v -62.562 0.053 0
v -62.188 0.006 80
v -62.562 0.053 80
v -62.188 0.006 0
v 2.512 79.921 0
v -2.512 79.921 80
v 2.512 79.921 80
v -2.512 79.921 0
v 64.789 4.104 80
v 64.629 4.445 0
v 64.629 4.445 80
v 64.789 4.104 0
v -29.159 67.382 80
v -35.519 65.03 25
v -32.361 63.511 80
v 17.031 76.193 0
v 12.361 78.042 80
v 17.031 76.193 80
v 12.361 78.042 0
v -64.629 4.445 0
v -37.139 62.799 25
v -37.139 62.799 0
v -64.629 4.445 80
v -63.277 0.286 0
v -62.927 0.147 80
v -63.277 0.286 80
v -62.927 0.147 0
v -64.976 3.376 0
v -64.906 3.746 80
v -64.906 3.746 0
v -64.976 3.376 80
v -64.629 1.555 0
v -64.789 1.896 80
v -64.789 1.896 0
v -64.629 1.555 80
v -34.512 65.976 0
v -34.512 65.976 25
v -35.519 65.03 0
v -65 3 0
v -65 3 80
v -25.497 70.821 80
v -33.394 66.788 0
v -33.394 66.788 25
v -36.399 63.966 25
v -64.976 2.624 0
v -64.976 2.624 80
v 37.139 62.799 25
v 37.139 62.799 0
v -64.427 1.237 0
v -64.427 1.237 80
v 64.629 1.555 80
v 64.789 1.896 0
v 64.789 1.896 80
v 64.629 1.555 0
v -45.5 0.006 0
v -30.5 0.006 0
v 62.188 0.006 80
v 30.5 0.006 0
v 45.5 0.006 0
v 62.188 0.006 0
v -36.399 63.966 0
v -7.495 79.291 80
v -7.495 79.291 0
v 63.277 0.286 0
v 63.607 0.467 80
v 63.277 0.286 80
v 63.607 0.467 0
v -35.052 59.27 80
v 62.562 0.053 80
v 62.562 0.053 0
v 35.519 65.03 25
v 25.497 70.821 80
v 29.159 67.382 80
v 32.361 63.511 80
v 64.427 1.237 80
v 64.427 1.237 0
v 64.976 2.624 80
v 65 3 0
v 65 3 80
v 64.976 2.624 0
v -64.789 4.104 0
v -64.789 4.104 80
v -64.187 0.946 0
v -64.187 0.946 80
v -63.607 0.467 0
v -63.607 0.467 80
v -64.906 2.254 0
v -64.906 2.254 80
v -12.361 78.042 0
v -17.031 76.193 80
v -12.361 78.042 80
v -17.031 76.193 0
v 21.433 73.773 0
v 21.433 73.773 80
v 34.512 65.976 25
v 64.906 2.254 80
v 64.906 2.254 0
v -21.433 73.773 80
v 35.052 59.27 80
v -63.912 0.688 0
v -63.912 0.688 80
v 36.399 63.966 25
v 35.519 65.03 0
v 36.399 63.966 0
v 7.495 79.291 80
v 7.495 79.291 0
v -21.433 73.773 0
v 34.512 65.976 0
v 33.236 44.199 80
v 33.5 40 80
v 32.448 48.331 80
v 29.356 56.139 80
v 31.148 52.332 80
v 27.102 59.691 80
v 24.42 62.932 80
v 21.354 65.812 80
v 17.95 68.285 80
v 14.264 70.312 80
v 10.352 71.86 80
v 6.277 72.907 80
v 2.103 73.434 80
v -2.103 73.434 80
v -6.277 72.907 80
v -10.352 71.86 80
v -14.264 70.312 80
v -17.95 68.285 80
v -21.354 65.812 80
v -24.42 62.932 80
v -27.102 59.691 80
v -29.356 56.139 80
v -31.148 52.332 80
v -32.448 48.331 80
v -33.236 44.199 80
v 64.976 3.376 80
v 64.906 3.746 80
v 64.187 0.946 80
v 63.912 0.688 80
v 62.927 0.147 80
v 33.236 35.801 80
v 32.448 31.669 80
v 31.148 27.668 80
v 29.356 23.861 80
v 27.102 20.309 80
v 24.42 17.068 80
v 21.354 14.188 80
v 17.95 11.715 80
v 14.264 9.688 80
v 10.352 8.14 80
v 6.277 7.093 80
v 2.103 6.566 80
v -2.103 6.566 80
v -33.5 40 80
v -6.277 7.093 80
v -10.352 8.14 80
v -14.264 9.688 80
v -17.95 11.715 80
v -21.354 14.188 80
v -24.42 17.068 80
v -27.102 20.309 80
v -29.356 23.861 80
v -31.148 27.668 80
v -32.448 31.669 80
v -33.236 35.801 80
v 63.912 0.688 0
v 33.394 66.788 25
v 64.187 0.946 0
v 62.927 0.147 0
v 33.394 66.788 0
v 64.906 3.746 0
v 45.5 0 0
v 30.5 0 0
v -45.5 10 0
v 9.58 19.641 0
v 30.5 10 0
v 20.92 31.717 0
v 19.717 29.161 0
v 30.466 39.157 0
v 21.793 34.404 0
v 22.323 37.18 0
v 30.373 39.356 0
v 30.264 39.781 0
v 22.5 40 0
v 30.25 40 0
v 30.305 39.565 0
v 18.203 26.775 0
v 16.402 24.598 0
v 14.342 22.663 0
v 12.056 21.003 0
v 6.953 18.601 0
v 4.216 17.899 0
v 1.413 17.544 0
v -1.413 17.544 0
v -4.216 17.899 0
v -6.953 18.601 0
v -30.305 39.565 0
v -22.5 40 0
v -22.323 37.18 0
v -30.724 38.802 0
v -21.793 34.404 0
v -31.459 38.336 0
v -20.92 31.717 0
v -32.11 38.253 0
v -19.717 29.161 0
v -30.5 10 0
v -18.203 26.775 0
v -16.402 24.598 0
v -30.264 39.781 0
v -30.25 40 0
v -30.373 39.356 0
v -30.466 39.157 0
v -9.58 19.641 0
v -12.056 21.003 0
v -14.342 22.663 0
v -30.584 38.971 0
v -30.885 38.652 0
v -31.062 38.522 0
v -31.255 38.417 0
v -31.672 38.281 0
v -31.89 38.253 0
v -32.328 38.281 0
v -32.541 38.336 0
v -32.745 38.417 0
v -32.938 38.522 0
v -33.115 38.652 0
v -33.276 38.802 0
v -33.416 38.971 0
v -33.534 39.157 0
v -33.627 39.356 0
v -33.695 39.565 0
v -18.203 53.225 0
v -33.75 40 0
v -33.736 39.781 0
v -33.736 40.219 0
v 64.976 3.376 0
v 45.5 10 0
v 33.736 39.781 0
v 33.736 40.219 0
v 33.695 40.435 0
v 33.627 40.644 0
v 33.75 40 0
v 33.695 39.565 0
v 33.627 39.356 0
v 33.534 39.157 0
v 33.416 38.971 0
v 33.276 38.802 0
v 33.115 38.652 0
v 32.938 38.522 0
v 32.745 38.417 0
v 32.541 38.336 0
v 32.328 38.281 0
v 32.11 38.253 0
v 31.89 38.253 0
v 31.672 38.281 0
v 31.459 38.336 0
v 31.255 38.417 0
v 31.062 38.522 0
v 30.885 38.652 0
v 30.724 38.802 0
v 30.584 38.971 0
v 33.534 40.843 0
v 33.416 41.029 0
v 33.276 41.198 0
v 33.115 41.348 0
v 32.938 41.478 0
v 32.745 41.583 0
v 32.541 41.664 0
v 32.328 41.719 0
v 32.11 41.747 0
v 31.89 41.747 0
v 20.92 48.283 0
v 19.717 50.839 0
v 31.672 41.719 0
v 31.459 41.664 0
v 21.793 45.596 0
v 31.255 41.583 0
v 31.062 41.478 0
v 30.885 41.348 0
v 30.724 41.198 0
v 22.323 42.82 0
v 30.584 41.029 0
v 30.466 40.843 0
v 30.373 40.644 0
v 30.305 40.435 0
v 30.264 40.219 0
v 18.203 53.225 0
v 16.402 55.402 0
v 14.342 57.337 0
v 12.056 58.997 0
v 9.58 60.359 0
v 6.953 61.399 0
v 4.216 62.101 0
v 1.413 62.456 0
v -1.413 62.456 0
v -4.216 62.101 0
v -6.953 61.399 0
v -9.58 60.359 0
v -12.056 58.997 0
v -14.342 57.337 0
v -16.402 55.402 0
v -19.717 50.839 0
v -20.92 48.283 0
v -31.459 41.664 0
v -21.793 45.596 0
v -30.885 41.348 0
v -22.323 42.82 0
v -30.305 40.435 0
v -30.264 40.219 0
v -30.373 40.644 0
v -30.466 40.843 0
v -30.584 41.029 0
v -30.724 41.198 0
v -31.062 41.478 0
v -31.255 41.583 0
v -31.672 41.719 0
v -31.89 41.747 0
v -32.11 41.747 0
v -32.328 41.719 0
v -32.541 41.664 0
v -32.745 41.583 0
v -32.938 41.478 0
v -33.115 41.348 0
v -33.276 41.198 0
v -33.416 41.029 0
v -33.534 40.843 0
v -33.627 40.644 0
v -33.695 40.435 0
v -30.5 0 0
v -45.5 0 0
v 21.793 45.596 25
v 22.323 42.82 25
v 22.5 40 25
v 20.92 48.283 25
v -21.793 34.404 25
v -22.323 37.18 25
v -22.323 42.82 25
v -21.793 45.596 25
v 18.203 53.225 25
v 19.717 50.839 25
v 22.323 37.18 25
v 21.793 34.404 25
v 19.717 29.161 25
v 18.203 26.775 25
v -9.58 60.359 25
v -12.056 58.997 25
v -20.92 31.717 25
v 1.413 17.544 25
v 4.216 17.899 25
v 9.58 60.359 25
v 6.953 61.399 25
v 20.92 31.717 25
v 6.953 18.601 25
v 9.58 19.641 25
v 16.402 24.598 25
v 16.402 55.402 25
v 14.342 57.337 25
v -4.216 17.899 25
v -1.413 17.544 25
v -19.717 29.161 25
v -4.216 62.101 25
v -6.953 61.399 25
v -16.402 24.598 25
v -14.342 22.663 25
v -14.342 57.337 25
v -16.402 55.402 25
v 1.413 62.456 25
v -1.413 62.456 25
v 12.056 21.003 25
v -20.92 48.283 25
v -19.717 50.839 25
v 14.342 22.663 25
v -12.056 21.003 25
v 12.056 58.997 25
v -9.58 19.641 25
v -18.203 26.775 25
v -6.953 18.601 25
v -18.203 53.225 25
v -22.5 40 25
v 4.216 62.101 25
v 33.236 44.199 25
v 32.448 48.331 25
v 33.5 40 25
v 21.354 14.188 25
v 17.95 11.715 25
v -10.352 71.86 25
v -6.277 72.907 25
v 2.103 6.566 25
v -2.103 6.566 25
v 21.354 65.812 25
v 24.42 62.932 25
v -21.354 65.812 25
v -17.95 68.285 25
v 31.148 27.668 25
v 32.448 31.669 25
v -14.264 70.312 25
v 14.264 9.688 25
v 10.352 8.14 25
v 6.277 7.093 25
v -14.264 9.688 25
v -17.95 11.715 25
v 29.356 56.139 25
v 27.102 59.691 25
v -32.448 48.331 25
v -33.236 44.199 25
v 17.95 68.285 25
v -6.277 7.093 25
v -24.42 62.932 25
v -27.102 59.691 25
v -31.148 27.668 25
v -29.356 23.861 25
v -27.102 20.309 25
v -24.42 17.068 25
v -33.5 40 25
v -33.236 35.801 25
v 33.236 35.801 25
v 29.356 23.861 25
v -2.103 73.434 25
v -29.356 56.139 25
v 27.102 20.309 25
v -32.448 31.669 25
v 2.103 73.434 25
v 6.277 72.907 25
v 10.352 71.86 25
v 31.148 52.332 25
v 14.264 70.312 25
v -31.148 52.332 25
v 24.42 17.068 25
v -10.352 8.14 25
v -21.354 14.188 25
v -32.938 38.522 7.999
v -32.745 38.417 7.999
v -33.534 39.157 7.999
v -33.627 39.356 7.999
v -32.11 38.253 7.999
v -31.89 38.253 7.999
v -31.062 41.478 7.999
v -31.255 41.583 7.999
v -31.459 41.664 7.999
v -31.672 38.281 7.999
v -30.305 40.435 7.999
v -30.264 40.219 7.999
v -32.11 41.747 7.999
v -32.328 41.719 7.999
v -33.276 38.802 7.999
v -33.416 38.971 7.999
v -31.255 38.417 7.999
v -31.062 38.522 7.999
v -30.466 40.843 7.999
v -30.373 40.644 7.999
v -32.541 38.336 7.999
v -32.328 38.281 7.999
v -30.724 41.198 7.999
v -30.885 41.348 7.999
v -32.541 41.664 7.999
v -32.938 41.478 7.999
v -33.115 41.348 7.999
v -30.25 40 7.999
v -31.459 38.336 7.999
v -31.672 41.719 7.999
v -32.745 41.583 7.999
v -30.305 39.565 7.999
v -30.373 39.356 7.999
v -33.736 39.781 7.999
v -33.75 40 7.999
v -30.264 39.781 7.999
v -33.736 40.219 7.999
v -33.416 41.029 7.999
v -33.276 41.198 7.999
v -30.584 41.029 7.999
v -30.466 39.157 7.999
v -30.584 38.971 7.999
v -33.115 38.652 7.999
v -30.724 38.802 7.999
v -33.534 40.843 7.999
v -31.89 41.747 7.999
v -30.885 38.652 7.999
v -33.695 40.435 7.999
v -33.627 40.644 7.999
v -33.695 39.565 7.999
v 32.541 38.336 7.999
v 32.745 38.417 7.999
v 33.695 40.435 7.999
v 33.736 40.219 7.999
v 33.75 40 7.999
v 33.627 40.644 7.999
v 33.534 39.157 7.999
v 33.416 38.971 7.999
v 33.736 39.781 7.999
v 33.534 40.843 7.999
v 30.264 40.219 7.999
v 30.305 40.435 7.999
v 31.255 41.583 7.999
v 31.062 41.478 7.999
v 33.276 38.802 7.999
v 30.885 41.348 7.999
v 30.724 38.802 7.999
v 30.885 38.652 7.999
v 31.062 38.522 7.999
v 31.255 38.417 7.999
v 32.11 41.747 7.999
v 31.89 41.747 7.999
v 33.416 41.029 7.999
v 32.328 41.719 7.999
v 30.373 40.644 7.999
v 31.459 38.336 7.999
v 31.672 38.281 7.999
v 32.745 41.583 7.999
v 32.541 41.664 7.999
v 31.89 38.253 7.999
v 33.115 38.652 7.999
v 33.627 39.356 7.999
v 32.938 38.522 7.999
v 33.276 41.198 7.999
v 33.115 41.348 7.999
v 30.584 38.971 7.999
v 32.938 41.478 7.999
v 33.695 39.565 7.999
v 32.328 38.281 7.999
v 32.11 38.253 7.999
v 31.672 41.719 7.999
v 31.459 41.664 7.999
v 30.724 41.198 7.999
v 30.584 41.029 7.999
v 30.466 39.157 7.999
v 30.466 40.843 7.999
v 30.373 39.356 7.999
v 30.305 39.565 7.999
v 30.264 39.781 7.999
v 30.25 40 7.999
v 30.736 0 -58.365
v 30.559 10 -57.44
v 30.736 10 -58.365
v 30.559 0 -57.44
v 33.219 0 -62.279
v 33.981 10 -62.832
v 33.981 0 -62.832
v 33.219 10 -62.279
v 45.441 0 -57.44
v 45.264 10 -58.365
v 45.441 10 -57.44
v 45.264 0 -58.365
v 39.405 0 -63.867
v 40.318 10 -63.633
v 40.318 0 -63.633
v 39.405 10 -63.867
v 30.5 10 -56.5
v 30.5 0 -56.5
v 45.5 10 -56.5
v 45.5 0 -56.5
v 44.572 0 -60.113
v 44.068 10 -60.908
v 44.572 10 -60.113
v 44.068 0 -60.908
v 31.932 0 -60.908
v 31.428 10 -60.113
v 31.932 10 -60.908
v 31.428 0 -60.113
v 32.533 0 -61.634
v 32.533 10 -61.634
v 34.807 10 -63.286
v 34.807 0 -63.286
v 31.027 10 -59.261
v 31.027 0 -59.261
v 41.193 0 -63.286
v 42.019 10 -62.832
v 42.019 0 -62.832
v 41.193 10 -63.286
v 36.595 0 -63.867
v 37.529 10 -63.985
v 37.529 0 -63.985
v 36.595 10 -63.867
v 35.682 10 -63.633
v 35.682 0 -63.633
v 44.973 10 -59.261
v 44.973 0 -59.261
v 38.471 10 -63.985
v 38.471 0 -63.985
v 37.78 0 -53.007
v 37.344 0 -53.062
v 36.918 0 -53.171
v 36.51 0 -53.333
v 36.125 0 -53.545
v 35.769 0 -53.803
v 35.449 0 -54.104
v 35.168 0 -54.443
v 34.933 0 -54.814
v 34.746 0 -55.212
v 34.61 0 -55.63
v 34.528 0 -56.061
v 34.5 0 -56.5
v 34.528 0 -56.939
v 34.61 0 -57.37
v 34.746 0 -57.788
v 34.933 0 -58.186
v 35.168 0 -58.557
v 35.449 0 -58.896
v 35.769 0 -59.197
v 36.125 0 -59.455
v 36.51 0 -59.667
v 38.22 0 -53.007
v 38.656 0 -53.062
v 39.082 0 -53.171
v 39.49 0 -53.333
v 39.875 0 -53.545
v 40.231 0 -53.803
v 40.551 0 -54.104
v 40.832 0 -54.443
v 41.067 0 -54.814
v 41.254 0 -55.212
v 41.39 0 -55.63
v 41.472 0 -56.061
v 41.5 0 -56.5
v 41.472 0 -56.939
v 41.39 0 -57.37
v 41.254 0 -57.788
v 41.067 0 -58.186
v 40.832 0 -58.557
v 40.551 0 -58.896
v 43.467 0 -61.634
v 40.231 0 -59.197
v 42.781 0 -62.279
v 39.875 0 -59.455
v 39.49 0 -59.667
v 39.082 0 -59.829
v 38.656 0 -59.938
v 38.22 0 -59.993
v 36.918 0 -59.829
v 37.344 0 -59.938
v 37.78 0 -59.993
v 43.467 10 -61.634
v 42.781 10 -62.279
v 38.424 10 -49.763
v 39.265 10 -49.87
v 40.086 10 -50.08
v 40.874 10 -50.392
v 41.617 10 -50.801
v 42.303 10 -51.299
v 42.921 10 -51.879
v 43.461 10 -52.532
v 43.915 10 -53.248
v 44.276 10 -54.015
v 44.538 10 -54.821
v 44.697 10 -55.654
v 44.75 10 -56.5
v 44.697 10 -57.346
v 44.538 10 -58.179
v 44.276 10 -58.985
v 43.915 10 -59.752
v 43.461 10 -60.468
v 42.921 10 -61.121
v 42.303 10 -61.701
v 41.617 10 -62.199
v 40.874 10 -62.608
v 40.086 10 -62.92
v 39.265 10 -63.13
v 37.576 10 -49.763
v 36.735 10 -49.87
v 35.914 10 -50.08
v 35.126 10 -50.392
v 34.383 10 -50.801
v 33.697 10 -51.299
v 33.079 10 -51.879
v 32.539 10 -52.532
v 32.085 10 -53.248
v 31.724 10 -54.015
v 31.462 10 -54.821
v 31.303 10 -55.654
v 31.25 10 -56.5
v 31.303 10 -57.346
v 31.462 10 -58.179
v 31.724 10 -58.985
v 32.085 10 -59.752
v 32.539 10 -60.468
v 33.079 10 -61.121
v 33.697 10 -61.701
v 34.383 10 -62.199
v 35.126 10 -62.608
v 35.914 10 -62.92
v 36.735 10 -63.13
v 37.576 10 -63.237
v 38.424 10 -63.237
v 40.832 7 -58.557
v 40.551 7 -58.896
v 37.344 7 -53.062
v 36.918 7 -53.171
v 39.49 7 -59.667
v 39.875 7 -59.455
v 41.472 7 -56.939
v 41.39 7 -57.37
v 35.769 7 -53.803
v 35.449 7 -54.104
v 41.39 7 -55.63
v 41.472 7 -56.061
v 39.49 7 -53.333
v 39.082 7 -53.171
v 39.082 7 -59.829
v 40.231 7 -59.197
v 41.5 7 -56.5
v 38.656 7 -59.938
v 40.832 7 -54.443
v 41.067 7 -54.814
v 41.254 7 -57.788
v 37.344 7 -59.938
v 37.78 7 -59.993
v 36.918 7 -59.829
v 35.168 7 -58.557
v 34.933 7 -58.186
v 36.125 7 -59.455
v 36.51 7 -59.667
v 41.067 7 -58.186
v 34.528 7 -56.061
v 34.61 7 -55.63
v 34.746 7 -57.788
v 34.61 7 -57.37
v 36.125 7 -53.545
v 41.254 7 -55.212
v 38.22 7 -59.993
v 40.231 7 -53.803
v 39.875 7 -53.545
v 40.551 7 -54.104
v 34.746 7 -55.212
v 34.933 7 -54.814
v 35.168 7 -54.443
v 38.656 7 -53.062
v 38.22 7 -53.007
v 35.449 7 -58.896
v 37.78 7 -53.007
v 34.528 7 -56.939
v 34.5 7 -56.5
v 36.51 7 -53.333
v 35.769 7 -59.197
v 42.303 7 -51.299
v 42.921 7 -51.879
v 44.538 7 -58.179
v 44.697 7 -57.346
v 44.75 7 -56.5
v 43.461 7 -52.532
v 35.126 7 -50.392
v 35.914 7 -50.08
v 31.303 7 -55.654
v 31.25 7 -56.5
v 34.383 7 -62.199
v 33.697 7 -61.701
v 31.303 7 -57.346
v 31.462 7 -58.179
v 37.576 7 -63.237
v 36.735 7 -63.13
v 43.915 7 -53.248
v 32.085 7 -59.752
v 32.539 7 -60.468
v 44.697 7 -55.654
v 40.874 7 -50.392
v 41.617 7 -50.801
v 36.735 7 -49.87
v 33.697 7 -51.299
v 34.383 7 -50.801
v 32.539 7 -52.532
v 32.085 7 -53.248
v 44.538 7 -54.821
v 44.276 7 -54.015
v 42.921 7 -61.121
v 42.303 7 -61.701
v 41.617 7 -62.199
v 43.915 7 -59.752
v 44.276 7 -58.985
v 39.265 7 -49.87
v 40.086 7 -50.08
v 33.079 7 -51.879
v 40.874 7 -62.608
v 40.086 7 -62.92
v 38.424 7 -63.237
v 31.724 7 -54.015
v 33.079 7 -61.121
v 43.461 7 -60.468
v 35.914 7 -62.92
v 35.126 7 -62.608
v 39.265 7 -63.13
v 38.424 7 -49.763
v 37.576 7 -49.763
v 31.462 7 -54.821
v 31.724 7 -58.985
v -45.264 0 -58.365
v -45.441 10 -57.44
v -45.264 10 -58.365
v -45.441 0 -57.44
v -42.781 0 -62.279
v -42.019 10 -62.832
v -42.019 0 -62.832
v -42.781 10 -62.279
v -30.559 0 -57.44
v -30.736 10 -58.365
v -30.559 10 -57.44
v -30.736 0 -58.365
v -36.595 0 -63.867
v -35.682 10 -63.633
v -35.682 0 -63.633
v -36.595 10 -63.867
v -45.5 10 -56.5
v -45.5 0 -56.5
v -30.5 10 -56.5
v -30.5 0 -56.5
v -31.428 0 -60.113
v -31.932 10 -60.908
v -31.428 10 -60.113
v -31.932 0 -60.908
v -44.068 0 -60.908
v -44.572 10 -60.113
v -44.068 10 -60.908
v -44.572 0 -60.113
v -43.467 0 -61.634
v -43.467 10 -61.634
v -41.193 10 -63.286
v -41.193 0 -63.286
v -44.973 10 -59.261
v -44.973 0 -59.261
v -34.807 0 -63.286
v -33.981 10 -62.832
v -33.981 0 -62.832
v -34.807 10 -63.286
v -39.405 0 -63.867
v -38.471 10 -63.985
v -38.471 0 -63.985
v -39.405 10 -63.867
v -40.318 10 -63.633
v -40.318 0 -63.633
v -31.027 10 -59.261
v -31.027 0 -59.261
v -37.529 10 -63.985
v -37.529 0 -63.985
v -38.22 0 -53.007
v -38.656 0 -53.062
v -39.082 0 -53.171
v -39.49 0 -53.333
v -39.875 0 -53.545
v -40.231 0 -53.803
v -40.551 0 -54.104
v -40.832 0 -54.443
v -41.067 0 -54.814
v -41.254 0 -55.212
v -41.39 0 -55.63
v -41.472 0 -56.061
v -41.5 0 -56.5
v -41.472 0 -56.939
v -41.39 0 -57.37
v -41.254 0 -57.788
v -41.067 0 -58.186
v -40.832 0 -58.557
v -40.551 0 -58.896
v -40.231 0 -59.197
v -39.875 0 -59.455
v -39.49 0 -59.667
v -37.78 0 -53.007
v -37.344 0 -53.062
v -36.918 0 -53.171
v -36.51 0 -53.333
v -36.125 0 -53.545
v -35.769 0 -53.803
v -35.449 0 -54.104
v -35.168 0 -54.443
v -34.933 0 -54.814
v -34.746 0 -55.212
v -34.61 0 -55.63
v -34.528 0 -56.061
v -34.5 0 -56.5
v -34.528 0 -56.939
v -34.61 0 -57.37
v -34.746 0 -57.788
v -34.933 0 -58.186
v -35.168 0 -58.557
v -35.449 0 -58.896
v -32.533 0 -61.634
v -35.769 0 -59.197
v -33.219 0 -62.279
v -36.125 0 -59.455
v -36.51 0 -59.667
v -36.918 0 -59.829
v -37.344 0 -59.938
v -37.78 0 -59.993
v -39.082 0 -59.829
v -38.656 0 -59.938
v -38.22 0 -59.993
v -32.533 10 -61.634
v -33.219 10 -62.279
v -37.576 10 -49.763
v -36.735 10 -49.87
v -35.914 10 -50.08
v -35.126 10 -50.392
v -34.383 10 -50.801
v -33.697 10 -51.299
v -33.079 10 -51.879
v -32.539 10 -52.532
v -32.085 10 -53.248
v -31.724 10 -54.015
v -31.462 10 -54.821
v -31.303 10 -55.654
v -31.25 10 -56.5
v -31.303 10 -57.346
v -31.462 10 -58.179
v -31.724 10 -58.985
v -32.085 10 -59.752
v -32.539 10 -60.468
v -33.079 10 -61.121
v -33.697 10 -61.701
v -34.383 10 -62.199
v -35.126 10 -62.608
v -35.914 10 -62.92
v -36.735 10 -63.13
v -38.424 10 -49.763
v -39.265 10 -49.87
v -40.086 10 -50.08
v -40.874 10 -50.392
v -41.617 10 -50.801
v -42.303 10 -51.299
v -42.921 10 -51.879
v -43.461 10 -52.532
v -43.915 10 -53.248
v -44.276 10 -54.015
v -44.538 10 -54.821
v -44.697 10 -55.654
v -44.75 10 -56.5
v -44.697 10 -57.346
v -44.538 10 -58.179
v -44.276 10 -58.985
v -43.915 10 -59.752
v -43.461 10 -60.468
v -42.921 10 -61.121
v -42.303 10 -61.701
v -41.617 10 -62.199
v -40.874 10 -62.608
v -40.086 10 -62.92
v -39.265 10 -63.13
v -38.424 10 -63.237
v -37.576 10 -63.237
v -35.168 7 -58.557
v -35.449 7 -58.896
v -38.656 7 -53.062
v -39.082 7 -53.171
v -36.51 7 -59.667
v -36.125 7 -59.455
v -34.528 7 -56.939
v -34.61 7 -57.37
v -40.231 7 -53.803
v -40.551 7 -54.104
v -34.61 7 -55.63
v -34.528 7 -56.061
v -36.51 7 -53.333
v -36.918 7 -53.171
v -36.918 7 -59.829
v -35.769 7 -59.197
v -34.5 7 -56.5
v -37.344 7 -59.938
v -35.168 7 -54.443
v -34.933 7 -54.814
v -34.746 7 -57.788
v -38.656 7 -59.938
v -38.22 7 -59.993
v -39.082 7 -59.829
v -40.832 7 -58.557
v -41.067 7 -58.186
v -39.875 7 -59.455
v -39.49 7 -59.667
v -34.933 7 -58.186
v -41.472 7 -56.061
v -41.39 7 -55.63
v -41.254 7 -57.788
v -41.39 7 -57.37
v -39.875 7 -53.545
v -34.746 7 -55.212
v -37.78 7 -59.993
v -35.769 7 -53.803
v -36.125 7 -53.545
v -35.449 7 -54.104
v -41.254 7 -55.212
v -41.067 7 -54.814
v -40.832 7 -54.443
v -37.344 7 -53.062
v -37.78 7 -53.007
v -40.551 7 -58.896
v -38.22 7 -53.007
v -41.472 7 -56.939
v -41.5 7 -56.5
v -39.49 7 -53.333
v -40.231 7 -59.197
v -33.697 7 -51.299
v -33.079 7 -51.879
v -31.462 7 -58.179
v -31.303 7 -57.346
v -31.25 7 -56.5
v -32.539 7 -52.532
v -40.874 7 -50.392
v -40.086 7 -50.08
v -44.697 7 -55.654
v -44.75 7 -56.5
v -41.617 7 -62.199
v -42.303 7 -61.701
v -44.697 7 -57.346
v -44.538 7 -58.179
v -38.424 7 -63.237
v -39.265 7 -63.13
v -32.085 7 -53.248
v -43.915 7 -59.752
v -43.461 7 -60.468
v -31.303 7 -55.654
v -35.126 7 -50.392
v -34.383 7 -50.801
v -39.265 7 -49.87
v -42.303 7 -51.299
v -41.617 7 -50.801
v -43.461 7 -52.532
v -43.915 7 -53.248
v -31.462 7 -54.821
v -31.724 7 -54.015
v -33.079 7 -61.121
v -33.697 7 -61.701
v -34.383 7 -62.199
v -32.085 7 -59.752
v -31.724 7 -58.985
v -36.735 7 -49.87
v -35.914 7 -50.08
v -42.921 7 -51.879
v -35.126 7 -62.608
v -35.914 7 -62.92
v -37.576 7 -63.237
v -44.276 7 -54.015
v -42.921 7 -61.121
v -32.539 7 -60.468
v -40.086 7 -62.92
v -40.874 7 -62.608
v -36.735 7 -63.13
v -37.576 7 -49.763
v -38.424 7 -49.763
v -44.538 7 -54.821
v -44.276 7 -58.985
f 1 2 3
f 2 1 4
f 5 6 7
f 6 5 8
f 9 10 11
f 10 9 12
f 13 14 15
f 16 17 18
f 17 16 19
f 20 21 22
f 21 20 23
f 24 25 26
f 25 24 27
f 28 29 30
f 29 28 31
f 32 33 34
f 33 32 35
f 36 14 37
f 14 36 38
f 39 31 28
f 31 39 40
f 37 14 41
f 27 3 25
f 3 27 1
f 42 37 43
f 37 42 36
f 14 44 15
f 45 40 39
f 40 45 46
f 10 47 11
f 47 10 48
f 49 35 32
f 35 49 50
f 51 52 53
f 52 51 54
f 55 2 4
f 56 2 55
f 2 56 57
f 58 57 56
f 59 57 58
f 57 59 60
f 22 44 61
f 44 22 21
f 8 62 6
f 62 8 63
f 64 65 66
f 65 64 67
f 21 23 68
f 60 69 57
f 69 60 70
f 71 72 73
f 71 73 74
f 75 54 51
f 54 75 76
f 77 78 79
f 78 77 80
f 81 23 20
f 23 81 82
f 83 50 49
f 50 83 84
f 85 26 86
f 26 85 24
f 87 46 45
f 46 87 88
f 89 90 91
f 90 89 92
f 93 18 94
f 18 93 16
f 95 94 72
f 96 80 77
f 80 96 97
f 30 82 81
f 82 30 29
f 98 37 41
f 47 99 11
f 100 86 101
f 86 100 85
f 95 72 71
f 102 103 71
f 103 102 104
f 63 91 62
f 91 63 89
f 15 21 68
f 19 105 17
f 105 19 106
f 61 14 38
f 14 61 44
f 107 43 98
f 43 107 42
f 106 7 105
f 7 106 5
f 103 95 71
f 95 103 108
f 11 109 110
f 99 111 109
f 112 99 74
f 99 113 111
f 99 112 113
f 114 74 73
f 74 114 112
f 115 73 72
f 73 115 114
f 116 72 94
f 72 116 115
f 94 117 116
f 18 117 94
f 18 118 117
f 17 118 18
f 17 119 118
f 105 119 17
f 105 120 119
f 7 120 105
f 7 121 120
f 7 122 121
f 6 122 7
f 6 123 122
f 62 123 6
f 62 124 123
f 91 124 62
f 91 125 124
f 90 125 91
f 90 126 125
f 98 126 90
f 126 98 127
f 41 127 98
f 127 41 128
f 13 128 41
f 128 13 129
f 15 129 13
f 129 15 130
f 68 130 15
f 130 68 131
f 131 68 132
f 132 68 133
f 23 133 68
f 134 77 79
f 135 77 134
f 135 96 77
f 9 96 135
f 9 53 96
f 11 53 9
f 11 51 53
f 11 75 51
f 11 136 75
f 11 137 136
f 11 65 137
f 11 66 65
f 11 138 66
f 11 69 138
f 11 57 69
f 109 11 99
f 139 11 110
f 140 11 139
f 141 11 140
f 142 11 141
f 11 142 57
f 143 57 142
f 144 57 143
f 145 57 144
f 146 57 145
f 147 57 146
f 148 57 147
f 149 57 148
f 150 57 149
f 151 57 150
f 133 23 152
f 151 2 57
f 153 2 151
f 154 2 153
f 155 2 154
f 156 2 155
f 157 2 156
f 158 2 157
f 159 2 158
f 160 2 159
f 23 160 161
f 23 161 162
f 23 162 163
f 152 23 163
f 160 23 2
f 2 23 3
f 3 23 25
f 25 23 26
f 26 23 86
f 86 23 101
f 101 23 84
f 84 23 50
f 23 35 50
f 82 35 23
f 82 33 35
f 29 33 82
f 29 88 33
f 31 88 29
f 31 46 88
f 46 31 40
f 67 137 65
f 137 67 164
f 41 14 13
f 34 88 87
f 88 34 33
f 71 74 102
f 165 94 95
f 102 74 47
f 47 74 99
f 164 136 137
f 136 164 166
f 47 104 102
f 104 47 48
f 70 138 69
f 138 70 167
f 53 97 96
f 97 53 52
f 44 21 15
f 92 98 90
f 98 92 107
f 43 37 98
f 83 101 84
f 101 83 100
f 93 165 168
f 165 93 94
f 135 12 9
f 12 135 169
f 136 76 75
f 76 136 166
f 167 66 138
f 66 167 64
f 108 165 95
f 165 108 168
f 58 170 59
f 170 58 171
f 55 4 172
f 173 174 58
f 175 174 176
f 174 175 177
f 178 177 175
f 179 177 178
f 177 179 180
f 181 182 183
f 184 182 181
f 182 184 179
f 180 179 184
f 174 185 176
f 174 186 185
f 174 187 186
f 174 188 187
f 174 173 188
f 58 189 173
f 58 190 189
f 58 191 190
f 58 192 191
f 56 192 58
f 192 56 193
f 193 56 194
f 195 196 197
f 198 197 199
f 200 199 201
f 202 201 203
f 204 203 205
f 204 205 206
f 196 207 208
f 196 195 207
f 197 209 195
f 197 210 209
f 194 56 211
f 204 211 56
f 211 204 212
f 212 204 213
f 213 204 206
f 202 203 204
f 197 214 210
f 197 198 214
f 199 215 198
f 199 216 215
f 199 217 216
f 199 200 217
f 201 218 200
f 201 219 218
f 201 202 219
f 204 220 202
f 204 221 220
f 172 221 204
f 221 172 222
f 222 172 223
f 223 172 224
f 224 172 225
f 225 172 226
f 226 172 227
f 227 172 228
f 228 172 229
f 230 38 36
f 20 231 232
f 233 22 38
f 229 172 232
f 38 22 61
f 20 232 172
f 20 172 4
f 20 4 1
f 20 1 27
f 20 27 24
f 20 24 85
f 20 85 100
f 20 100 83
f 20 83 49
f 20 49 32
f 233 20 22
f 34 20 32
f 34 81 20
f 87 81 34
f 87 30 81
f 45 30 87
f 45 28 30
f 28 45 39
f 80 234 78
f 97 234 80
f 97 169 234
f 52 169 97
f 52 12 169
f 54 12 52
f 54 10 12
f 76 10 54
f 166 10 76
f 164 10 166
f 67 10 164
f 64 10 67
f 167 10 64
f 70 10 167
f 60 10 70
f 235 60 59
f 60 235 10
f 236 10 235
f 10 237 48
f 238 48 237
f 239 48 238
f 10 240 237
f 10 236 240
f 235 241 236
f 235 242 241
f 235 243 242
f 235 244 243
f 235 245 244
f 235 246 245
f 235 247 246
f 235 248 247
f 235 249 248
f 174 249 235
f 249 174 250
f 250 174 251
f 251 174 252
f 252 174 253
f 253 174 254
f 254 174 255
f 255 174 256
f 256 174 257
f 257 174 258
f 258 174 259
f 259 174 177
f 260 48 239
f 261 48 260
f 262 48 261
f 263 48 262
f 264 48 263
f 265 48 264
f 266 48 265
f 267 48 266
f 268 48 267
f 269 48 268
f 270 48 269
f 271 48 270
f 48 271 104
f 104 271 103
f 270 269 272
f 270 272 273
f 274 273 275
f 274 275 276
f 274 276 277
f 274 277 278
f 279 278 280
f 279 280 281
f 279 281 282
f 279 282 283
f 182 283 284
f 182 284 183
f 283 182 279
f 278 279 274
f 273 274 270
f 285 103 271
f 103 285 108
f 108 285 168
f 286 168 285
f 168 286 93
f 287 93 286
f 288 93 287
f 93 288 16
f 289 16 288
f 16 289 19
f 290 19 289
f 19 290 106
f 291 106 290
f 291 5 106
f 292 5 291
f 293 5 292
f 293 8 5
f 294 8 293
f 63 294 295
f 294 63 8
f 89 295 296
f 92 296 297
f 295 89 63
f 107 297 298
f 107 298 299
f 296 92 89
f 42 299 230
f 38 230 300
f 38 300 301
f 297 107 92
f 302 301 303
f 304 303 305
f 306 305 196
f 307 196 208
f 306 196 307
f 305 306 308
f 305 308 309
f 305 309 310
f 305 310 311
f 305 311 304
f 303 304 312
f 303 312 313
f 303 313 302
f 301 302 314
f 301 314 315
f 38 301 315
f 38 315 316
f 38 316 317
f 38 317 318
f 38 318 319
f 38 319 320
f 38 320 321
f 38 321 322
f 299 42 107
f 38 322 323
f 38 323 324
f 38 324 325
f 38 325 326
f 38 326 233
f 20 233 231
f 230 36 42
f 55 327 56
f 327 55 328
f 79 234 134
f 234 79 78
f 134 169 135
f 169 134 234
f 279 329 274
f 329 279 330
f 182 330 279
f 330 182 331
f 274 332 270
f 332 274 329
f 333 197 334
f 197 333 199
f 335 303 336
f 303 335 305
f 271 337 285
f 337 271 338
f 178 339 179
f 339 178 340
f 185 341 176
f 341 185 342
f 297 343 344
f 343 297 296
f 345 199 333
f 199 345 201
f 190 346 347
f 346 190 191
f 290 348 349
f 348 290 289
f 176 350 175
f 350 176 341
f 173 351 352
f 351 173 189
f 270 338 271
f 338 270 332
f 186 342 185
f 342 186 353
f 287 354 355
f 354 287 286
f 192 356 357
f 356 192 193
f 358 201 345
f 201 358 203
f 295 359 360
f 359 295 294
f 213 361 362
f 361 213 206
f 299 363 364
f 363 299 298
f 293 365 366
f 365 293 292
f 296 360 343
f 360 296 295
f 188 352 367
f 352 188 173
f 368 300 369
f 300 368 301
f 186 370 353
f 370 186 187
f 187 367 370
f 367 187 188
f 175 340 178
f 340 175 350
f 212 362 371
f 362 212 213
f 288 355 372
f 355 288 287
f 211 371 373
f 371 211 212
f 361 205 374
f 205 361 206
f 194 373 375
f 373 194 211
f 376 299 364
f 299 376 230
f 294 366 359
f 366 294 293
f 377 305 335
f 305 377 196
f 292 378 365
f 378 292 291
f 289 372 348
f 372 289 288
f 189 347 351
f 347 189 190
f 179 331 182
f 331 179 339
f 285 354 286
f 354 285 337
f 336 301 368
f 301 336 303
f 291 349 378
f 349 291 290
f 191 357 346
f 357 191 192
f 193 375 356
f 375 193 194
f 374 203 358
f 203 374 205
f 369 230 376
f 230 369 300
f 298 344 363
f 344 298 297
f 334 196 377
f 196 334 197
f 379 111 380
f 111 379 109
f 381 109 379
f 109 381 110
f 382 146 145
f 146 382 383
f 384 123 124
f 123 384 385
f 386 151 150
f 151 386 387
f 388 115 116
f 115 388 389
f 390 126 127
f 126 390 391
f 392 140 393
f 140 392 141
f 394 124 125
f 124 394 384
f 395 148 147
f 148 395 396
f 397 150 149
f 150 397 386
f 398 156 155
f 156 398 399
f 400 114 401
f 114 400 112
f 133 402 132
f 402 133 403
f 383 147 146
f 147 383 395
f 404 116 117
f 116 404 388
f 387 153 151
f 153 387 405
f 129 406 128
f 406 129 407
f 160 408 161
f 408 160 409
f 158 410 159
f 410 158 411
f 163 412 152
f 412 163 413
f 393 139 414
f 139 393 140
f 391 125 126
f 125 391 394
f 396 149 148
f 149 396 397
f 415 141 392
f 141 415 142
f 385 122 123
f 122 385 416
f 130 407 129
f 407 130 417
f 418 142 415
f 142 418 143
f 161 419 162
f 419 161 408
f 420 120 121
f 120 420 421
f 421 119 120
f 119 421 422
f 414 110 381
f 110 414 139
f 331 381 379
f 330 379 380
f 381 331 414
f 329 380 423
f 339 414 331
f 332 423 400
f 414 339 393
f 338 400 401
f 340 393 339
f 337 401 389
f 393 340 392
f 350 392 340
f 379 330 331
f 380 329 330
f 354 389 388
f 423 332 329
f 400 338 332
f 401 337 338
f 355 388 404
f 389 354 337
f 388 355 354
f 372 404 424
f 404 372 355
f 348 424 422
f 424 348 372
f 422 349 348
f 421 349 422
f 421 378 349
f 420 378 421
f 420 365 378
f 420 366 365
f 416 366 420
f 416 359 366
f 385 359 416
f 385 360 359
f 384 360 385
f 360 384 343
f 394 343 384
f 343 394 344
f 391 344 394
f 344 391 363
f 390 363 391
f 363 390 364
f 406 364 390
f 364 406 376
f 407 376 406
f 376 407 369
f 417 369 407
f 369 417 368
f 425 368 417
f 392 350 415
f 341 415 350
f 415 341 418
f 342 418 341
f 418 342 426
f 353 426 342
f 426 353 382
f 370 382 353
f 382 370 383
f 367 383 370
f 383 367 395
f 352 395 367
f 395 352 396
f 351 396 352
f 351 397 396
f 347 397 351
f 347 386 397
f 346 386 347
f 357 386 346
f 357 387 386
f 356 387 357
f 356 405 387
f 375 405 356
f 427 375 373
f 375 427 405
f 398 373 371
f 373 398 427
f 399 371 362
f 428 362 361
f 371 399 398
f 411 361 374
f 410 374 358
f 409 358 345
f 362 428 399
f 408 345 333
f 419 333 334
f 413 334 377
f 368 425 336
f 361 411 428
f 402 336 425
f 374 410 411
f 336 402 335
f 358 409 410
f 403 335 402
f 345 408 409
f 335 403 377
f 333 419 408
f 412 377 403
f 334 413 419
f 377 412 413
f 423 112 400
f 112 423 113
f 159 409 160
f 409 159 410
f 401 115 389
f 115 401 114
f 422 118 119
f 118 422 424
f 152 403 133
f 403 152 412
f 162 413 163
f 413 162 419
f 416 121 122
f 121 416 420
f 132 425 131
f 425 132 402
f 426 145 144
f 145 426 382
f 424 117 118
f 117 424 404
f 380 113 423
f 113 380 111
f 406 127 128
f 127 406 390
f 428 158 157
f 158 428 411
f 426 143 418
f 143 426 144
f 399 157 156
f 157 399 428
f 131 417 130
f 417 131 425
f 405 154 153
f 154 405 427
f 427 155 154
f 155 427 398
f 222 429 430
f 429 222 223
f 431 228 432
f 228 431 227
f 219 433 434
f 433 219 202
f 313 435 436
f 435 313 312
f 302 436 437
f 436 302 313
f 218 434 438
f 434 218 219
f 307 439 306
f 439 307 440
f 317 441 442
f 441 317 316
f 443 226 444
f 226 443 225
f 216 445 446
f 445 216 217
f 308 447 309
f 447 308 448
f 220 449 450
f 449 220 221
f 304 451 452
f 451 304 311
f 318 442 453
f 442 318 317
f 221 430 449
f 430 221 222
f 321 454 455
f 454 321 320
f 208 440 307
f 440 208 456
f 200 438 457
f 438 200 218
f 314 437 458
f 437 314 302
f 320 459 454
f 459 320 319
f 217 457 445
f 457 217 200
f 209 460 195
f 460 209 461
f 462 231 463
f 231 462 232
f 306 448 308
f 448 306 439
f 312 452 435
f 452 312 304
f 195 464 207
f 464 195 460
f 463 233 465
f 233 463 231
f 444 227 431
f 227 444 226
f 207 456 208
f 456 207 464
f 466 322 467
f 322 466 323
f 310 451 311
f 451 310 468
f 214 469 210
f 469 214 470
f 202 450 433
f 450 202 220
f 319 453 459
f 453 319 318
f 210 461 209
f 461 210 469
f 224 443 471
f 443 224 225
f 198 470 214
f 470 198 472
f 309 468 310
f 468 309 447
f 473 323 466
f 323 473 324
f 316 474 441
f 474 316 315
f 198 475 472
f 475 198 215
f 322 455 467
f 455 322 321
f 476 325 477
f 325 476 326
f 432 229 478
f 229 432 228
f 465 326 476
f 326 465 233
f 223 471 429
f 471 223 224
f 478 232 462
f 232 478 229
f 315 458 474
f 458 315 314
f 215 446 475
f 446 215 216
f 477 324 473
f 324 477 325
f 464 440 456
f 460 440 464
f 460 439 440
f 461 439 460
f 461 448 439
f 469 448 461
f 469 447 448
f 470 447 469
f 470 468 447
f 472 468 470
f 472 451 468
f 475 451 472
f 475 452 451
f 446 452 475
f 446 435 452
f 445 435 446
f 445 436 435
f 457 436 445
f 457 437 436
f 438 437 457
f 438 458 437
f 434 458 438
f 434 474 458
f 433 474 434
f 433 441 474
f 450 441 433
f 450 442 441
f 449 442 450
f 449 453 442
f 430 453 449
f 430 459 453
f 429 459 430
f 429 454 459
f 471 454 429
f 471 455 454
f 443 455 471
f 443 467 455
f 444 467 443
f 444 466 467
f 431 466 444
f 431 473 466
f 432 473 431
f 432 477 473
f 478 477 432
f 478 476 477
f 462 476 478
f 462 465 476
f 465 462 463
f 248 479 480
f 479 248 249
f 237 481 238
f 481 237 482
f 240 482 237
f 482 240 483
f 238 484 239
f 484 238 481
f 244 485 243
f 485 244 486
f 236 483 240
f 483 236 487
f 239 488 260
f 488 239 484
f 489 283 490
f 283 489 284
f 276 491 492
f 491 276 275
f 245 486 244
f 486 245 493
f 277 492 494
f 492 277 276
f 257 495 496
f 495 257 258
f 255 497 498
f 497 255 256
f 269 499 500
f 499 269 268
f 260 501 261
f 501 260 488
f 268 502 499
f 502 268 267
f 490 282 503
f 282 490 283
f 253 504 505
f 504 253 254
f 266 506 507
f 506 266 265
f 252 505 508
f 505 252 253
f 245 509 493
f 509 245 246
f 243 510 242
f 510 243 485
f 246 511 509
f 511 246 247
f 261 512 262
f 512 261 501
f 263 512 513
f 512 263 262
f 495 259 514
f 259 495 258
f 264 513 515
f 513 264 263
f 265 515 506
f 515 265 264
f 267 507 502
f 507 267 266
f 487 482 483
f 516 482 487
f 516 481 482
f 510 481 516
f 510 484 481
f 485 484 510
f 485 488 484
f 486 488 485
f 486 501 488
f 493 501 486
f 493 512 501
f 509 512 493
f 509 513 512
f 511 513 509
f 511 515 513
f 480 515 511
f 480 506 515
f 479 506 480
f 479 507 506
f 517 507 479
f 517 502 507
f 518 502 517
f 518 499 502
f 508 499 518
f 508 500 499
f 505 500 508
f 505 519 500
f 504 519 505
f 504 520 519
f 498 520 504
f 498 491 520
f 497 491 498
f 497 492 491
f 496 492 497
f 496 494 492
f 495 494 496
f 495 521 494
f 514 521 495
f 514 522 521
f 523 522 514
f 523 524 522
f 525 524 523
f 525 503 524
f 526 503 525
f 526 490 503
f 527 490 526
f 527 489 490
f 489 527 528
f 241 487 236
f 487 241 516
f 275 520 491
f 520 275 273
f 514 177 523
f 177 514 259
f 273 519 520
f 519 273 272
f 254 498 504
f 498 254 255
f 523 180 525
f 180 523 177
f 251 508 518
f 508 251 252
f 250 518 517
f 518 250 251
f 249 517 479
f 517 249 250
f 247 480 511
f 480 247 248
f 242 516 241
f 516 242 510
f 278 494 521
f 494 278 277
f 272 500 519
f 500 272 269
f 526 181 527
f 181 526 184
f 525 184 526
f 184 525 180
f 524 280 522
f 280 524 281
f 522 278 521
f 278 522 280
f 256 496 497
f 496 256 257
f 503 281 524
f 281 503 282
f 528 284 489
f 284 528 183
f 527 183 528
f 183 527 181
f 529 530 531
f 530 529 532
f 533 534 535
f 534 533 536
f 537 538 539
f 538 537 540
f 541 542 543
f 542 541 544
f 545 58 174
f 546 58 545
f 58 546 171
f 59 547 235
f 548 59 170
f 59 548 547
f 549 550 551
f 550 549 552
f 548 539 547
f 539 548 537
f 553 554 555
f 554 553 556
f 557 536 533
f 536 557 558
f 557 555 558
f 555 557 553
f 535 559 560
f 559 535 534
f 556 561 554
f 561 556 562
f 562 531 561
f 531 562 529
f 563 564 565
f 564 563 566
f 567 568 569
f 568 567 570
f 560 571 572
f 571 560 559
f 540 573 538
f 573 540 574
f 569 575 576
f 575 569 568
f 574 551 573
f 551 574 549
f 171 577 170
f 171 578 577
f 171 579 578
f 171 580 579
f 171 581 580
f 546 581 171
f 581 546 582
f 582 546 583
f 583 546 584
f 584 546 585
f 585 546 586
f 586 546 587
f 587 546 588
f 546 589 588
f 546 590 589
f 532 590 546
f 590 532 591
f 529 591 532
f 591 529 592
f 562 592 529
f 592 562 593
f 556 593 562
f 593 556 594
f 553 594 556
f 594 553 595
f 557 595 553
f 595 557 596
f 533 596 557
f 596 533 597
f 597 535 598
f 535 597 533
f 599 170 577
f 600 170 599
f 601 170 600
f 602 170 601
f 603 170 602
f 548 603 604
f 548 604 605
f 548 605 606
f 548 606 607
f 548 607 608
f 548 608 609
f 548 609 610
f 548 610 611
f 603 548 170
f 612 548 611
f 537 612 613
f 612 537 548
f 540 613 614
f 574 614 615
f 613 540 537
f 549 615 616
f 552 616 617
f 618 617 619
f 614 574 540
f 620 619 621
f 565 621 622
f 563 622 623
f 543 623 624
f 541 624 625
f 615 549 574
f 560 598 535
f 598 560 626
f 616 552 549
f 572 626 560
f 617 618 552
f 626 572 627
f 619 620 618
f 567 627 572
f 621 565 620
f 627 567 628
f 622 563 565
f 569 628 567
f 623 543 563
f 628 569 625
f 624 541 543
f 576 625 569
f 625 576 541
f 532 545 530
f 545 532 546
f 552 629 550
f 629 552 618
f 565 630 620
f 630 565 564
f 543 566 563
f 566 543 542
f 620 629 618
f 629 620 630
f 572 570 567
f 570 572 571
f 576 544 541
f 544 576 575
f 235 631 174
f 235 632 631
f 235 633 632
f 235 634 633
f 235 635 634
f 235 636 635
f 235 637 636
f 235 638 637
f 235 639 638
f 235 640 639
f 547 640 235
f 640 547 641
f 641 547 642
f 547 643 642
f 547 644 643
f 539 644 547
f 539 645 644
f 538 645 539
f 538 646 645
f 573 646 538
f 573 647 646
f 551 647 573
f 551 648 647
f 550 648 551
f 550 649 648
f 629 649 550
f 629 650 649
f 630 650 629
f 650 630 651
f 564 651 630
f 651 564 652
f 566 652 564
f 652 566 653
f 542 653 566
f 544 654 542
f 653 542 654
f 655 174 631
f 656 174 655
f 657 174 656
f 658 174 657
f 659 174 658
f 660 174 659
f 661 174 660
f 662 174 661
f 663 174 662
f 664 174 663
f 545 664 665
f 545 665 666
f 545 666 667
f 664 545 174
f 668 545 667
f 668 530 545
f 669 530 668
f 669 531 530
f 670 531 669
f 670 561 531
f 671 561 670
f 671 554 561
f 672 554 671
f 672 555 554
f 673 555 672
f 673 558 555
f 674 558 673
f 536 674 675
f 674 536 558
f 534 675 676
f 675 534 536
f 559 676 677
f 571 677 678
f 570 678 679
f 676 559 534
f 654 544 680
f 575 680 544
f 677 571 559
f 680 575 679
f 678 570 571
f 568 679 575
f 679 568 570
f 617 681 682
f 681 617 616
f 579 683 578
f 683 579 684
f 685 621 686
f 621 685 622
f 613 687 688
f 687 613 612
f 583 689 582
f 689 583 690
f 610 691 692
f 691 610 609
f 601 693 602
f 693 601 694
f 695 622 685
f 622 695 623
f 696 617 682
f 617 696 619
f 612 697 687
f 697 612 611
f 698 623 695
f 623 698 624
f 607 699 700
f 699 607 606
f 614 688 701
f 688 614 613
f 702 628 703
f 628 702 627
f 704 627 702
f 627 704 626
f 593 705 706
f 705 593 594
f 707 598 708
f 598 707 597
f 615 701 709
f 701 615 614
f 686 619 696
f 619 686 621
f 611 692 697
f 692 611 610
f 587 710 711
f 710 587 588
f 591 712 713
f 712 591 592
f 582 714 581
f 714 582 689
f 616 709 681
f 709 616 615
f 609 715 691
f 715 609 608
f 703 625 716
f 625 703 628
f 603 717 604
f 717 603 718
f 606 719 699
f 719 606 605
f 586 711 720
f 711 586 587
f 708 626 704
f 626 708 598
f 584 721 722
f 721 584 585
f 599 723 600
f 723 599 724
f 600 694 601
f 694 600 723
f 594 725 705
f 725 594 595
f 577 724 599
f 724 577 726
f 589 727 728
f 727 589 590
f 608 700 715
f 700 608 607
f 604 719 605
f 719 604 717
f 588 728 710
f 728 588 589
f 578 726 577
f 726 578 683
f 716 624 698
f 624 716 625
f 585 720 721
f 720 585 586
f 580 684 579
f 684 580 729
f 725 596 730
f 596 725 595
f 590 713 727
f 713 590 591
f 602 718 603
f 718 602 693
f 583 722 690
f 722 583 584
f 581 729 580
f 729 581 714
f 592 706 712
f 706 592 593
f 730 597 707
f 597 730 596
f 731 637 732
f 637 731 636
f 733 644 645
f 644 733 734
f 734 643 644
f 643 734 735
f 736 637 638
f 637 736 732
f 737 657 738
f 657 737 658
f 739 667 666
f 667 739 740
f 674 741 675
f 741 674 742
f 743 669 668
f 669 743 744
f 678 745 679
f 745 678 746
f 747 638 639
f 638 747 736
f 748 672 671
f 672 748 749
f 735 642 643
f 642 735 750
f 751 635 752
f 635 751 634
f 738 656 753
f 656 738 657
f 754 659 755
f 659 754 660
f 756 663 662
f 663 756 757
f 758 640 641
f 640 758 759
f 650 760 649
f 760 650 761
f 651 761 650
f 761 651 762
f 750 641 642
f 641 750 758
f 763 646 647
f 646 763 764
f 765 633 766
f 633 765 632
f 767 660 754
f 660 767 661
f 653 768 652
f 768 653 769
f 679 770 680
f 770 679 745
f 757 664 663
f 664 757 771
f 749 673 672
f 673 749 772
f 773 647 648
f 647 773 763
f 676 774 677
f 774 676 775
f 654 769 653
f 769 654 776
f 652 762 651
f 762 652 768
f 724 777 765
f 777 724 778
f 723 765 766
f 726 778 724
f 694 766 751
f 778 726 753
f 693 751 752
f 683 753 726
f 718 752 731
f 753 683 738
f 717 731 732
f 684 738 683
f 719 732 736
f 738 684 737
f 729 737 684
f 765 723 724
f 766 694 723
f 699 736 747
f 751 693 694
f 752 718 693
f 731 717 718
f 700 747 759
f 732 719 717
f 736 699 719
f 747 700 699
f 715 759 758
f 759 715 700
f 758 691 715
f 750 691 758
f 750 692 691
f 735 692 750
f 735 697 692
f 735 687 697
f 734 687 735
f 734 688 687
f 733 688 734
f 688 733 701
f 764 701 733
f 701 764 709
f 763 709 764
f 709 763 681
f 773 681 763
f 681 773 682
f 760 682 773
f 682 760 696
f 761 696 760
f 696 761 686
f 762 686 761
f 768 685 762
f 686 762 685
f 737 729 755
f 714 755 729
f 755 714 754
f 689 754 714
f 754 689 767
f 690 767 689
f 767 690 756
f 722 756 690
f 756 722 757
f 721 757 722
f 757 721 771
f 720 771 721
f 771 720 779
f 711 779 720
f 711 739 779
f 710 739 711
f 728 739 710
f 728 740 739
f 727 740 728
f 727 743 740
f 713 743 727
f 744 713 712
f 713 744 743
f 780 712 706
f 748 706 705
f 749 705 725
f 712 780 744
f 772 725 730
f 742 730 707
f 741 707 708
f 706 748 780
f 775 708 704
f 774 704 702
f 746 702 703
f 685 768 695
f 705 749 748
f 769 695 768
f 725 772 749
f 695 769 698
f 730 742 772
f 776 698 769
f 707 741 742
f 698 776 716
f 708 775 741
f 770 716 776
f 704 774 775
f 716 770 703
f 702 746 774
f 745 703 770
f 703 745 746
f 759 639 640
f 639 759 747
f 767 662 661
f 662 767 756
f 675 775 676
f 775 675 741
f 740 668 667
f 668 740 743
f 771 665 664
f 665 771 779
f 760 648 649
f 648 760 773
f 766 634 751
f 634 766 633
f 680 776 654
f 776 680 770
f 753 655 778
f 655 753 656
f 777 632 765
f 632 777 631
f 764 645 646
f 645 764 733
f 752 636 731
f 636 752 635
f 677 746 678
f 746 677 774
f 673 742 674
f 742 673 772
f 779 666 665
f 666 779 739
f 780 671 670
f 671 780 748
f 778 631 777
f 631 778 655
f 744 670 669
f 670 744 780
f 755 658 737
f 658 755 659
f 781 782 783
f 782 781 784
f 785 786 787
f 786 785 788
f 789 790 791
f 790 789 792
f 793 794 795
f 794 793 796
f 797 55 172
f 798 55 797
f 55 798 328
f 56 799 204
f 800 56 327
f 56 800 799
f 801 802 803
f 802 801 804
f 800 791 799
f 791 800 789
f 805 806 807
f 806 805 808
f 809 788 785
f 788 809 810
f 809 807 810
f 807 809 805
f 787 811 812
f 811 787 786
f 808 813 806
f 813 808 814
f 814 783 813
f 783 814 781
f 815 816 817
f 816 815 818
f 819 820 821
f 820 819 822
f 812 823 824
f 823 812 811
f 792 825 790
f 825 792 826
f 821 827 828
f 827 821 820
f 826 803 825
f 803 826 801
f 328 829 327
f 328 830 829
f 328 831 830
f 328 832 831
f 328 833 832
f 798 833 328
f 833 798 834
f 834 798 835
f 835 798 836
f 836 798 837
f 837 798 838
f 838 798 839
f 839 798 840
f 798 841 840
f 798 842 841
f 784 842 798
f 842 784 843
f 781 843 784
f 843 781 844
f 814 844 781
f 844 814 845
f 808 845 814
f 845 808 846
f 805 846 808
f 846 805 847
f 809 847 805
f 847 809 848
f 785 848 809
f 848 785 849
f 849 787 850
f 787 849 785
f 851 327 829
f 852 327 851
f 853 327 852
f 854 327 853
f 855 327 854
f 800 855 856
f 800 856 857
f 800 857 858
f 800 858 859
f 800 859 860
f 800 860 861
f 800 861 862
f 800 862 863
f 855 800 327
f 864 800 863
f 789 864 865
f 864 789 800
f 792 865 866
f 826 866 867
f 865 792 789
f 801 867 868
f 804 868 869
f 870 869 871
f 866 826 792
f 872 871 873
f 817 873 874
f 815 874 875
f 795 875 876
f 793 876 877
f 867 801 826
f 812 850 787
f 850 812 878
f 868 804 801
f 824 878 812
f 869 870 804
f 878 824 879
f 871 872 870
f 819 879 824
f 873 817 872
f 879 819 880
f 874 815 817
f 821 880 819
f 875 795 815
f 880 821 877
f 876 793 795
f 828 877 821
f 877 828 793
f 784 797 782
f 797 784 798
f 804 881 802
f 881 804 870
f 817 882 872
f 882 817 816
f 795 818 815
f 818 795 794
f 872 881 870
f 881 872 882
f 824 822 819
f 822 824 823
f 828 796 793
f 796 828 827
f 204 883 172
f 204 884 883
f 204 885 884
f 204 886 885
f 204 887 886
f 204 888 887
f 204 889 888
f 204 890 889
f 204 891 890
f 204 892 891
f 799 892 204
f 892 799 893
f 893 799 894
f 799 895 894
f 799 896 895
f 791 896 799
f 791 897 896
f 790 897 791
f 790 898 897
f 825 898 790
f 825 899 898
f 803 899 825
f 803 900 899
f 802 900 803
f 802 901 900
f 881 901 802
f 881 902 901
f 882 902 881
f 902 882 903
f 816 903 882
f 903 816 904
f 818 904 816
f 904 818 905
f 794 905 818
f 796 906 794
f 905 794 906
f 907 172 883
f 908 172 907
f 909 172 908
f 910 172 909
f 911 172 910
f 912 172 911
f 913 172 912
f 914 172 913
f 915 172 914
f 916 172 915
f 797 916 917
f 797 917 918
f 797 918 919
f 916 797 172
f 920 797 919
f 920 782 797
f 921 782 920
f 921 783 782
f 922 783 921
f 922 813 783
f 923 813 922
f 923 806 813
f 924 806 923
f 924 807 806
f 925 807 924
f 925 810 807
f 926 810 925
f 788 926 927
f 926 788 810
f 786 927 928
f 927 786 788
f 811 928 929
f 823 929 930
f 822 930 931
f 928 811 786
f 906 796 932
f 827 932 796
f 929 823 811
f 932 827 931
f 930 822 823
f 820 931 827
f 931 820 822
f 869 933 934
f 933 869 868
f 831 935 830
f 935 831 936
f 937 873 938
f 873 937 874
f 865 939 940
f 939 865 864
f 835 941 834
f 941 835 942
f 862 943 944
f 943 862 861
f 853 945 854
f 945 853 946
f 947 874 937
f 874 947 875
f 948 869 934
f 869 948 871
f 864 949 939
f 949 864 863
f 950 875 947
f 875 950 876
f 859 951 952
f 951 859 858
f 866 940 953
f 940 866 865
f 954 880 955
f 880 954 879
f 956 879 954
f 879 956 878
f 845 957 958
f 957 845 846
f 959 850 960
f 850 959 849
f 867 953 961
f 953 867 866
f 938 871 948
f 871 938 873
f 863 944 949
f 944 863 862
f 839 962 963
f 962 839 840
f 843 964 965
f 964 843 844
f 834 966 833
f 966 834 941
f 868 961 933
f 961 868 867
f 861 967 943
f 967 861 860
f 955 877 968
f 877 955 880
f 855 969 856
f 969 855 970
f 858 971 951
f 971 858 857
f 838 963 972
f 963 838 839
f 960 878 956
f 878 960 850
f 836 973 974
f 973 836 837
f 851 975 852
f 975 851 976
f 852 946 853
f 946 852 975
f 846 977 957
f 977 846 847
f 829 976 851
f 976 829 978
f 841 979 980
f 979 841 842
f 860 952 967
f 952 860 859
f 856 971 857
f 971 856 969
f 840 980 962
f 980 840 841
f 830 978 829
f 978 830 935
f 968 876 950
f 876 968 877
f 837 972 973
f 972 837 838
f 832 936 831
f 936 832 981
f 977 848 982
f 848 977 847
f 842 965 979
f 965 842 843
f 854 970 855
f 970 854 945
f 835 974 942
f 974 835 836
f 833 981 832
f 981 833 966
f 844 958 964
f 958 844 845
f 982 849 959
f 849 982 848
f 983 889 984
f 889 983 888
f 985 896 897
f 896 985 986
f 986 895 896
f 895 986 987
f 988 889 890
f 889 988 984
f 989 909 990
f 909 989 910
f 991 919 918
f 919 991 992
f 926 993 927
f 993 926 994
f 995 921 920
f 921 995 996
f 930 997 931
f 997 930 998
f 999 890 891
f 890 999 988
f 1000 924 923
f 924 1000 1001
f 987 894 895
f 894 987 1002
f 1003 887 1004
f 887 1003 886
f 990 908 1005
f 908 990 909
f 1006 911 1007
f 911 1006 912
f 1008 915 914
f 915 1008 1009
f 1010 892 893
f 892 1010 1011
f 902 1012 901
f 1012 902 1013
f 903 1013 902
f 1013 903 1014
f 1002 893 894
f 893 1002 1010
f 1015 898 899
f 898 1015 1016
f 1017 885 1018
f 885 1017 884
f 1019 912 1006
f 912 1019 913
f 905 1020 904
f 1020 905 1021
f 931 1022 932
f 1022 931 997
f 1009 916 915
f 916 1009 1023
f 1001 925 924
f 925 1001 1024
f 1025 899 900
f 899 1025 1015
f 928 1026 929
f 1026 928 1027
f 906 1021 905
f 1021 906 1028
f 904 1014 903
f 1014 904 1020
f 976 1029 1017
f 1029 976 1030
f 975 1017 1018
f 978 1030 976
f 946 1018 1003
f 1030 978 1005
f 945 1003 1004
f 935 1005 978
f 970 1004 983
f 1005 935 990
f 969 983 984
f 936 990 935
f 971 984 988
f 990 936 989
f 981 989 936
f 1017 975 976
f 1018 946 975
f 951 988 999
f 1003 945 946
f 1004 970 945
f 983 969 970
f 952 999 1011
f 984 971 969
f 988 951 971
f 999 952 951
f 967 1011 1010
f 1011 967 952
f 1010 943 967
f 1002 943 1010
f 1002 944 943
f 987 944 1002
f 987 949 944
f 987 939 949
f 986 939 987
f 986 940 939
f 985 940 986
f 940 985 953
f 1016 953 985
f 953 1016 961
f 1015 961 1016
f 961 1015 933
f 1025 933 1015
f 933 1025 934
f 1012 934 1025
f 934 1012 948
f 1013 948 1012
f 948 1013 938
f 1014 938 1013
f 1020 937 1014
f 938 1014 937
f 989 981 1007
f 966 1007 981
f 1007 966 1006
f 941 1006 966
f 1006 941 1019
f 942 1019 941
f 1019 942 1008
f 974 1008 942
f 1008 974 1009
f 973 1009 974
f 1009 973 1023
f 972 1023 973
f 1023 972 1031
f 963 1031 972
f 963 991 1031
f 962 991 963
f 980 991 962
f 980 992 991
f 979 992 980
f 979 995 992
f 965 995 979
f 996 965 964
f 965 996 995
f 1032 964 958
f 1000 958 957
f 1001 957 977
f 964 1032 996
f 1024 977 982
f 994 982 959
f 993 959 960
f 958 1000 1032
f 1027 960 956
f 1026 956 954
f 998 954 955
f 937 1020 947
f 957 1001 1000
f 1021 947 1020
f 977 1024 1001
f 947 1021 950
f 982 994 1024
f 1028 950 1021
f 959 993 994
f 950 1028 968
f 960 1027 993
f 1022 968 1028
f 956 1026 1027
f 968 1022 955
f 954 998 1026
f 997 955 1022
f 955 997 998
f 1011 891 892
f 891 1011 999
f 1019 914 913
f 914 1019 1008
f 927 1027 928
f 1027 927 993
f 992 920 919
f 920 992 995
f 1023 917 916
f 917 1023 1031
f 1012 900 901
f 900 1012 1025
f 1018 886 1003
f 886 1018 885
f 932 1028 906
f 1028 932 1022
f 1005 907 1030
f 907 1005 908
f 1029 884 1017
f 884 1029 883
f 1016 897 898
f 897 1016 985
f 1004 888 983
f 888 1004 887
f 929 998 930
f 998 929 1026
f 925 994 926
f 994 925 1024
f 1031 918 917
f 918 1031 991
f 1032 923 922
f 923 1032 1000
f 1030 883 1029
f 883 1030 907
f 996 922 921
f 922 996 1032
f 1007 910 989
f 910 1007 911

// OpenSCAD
// file: front_plug_common.scad
receptacleOuterDia=80;
receptacleInnerDia=45;

receptacleMountingRingInsetDia=61;

receptacleBracketBaseWidth=130;
receptacleBracketBaseCornerRadius=3;

motorMountPlateWidth=155;

receptacleFaceplateScrewCenterWidth=64;
receptacleFaceplateScrewHoleDia=3.5;
receptacleFaceplateScrewDepth=8;

// This is how far the transition casing sticks back from the trailing edge of the motor mount.
transitionWidthAtV=100;

motorMountPlateVOffset=114;

motorMountPlateVOffsetShortSide=motorMountPlateWidth-motorMountPlateVOffset;
// main file
include <front_plug_common.scad>

receptacleFaceplateWidth=77;
receptacleFaceplateHeight=57;
receptacleFaceplateThickness=5;
receptacleFaceplateCornerRadius=11;

motorMountHoleCenterWidth=76;
motorMountBoltShaftDia=7;
motorMountBoltHeadInsetDia=13.5;
// length from base of bolt head to motor mount plate.
motorMountBoltShaftThruLength=10;
motorMountBoltInsetFromFace=20;

receptacleMountingRingClearance=3;
mountingPlateThickness=25;

// perpendicular to the face, from front to back
receptacleBracketLength=80;

// (to center) Used to calculate the length of the screw tabs
mountingHoleInsetFromMotorMountBack=136.5;

// calculated
faceplateBottomOffset=receptacleOuterDia/2-receptacleFaceplateHeight/2;

screwTabLengthToHoleCenter=mountingHoleInsetFromMotorMountBack-receptacleBracketLength;

// common
surfaceThickness=0.01;
overlap=0.001;
$fn=50;

//color([1,0,0]) {
    translate([-receptacleFaceplateWidth/2+receptacleFaceplateCornerRadius,
        faceplateBottomOffset+receptacleFaceplateCornerRadius,
        -receptacleFaceplateThickness])
        %receptacle();
//}
union() {
    bracketBody();
    translate([motorMountHoleCenterWidth/2,0,0])
        rotate([-90,0,0]) screwTab();
    translate([-motorMountHoleCenterWidth/2,0,0])
        rotate([-90,0,0]) screwTab();
}

module bracketBody() {
    difference() {
        hull() {
            // left base corner
            translate([-receptacleBracketBaseWidth/2+receptacleBracketBaseCornerRadius,
                    receptacleBracketBaseCornerRadius,0]) 
                cylinder(r=receptacleBracketBaseCornerRadius, h=receptacleBracketLength);
            // right base corner
            translate([receptacleBracketBaseWidth/2-receptacleBracketBaseCornerRadius,
                    receptacleBracketBaseCornerRadius,0]) 
                cylinder(r=receptacleBracketBaseCornerRadius, h=receptacleBracketLength);
            translate([0,receptacleOuterDia/2,0]) 
                cylinder(d=receptacleOuterDia, h=receptacleBracketLength);
            translate([0,faceplateBottomOffset,0])
                hull() {  // faceplate
                    translate([-receptacleFaceplateWidth/2+receptacleFaceplateCornerRadius,
                            receptacleFaceplateHeight-receptacleFaceplateCornerRadius,0]) 
                        cylinder(r=receptacleFaceplateCornerRadius, h=mountingPlateThickness);
                    translate([receptacleFaceplateWidth/2-receptacleFaceplateCornerRadius,
                            receptacleFaceplateHeight-receptacleFaceplateCornerRadius,0]) 
                        cylinder(r=receptacleFaceplateCornerRadius, h=mountingPlateThickness);
                    
                    translate([-receptacleFaceplateWidth/2+receptacleFaceplateCornerRadius,
                            receptacleFaceplateCornerRadius,0]) 
                        cylinder(r=receptacleFaceplateCornerRadius, h=mountingPlateThickness);
                    translate([receptacleFaceplateWidth/2-receptacleFaceplateCornerRadius,
                            receptacleFaceplateCornerRadius,0]) 
                        cylinder(r=receptacleFaceplateCornerRadius, h=mountingPlateThickness);
                }
        }
        translate([0,receptacleOuterDia/2,-overlap]) 
            cylinder(d=receptacleInnerDia, h=receptacleBracketLength+overlap*2);
        translate([0,receptacleOuterDia/2,mountingPlateThickness]) 
            cylinder(d=receptacleMountingRingInsetDia+2*receptacleMountingRingClearance, 
                h=receptacleBracketLength-mountingPlateThickness+overlap);
        // Left faceplate screw hole
        translate([-receptacleFaceplateScrewCenterWidth/2,
                faceplateBottomOffset+receptacleFaceplateHeight/2,-overlap])
            rotate([0,0,0])
                cylinder(d=receptacleFaceplateScrewHoleDia, h=receptacleFaceplateScrewDepth);
        // Right faceplate screw hole
        translate([receptacleFaceplateScrewCenterWidth/2,
                faceplateBottomOffset+receptacleFaceplateHeight/2,-overlap])
            rotate([0,0,0])
                cylinder(d=receptacleFaceplateScrewHoleDia, h=receptacleFaceplateScrewDepth);
    }
}

module screwTab() {
    screwTabWidth=15;
    screwTabThickness=10;
    screwTabInsetDepth=3;
    difference() {
        hull() {
            translate([-screwTabWidth/2,0,0])
                cube([screwTabWidth,screwTabLengthToHoleCenter,screwTabThickness]);
            translate([0,screwTabLengthToHoleCenter,0])
                cylinder(d=screwTabWidth, h=screwTabThickness);
        }
        // bolt thru-hole
        translate([0,screwTabLengthToHoleCenter,-overlap])
            cylinder(d=motorMountBoltShaftDia, h=receptacleOuterDia+overlap*2);
        // bolt head inset
        translate([0,screwTabLengthToHoleCenter,screwTabThickness-screwTabInsetDepth])
            cylinder(d=motorMountBoltHeadInsetDia, h=receptacleOuterDia+overlap*2);
    }
}


module receptacle() {
    minkowski() {
        cube([receptacleFaceplateWidth-receptacleFaceplateCornerRadius*2,
            receptacleFaceplateHeight-receptacleFaceplateCornerRadius*2,
            receptacleFaceplateThickness-surfaceThickness]);
        cylinder(r=receptacleFaceplateCornerRadius, h=surfaceThickness);
    }
}
